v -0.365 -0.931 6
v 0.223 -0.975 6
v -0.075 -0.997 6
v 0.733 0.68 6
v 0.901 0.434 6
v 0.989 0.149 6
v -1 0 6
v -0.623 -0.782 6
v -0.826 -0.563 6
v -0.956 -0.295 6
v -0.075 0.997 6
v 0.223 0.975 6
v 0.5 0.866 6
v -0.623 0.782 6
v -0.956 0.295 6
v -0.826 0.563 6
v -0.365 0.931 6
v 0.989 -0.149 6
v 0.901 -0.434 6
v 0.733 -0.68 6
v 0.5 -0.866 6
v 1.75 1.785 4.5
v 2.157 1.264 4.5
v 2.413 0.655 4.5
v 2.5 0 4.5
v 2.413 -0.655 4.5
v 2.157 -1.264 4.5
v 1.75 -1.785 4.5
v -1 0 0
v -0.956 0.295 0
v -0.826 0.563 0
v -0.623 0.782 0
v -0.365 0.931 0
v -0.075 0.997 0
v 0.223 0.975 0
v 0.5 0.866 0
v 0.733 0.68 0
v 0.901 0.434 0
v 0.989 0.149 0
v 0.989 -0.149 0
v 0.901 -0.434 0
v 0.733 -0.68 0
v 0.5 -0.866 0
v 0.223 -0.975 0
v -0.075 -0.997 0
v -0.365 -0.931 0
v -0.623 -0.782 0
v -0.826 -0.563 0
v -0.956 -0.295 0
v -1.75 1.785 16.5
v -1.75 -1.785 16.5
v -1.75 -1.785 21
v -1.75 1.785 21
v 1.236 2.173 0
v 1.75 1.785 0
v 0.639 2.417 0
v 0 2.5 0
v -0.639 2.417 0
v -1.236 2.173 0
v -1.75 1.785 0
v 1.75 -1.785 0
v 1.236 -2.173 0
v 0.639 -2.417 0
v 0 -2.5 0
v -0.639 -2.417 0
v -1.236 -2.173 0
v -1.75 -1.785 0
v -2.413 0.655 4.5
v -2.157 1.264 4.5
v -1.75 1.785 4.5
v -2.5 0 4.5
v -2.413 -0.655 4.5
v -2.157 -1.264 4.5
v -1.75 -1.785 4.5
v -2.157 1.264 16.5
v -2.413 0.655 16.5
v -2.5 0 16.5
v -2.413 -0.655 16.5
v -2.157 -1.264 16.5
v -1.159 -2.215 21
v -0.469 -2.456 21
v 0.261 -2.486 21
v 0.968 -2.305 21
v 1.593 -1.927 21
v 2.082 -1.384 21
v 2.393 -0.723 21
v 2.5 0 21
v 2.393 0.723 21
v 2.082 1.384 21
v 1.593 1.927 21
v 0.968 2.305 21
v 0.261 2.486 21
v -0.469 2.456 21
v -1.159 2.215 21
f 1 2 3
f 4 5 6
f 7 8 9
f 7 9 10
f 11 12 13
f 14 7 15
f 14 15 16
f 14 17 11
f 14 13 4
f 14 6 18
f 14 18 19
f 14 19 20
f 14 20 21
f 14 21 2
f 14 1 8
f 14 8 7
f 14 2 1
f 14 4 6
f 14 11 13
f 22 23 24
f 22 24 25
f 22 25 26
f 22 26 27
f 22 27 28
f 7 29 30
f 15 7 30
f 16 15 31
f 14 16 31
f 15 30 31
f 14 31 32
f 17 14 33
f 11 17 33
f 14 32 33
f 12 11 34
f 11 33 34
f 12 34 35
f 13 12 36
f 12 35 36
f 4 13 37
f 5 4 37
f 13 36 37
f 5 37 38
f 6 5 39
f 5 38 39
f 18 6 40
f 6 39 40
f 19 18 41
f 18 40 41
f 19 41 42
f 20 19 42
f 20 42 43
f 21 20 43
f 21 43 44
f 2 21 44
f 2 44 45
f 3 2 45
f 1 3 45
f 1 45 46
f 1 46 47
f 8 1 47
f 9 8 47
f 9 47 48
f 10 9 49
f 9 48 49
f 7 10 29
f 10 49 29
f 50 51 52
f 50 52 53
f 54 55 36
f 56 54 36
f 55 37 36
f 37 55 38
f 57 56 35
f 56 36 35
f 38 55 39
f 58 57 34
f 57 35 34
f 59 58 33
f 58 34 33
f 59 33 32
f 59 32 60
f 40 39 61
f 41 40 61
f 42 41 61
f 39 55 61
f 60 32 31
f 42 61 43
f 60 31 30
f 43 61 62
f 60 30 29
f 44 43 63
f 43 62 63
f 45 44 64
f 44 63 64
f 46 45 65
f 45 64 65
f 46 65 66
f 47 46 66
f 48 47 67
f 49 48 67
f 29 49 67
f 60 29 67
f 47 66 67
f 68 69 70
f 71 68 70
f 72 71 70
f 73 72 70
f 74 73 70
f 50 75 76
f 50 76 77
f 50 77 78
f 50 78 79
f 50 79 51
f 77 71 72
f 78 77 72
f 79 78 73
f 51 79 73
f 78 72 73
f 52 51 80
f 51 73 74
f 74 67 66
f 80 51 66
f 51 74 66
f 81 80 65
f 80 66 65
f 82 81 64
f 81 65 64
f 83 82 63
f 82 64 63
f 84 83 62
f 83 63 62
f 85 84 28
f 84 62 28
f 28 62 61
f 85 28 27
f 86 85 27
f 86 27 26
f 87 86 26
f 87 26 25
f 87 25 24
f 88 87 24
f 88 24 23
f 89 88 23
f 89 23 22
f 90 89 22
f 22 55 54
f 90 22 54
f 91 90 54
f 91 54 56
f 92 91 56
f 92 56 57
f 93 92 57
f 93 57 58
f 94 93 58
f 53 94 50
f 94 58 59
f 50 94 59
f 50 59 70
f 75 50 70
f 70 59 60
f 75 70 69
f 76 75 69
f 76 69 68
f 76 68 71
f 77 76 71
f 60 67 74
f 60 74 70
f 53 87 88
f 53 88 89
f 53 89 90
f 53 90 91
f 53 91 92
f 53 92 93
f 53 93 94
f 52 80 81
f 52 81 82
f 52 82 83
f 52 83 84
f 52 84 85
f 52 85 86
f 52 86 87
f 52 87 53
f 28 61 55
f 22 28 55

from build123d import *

# Parameters (mm, degrees)
SKETCH1_R           = 2.5
BOSS_EXTRUDE1_DEPTH = 21
CUT_EXTRUDE2_DEPTH  = 4.5
SKETCH3_R           = 1
CUT_EXTRUDE3_DEPTH  = 6
CUT_EXTRUDE4_START  = -4.5
CUT_EXTRUDE4_DEPTH  = 4.5


with BuildPart() as part:
    # Sketch1 → Boss-Extrude1 (new body)
    with BuildSketch(Plane.XY):
        with Locations(Location((0, 0, 0), (0, 0, 180))):
            Circle(SKETCH1_R)
    extrude(amount=BOSS_EXTRUDE1_DEPTH)

    # Sketch2 → Cut-Extrude2 (cut)
    with BuildSketch(Plane(origin=(0, 0, 0), x_dir=(-1, 0, 0), z_dir=(0, 0, -1))):
        with BuildLine():
            Line((-1.75, -1.785357107), (-1.75, 1.785357107))
            ThreePointArc((-1.75, 1.785357107), (-2.5, 0), (-1.75, -1.785357107))
        make_face()
        with BuildLine():
            Line((1.75, -1.785357107), (1.75, 1.785357107))
            ThreePointArc((1.75, 1.785357107), (2.5, 0), (1.75, -1.785357107))
        make_face()
    extrude(amount=-CUT_EXTRUDE2_DEPTH, mode=Mode.SUBTRACT)

    # Sketch3 → Cut-Extrude3 (cut)
    with BuildSketch(Plane(origin=(0, 0, 0), x_dir=(-1, 0, 0), z_dir=(0, 0, -1))):
        Circle(SKETCH3_R)
    extrude(amount=-CUT_EXTRUDE3_DEPTH, mode=Mode.SUBTRACT)

    # Sketch4 → Cut-Extrude4 (cut)
    with BuildSketch(Plane.XY.offset(21).offset(CUT_EXTRUDE4_START)):
        with BuildLine():
            Line((-1.75, -1.785357107), (-1.75, 1.785357107))
            ThreePointArc((-1.75, 1.785357107), (-2.5, 0), (-1.75, -1.785357107))
        make_face()
    extrude(amount=CUT_EXTRUDE4_DEPTH, mode=Mode.SUBTRACT)


solid = part.part
